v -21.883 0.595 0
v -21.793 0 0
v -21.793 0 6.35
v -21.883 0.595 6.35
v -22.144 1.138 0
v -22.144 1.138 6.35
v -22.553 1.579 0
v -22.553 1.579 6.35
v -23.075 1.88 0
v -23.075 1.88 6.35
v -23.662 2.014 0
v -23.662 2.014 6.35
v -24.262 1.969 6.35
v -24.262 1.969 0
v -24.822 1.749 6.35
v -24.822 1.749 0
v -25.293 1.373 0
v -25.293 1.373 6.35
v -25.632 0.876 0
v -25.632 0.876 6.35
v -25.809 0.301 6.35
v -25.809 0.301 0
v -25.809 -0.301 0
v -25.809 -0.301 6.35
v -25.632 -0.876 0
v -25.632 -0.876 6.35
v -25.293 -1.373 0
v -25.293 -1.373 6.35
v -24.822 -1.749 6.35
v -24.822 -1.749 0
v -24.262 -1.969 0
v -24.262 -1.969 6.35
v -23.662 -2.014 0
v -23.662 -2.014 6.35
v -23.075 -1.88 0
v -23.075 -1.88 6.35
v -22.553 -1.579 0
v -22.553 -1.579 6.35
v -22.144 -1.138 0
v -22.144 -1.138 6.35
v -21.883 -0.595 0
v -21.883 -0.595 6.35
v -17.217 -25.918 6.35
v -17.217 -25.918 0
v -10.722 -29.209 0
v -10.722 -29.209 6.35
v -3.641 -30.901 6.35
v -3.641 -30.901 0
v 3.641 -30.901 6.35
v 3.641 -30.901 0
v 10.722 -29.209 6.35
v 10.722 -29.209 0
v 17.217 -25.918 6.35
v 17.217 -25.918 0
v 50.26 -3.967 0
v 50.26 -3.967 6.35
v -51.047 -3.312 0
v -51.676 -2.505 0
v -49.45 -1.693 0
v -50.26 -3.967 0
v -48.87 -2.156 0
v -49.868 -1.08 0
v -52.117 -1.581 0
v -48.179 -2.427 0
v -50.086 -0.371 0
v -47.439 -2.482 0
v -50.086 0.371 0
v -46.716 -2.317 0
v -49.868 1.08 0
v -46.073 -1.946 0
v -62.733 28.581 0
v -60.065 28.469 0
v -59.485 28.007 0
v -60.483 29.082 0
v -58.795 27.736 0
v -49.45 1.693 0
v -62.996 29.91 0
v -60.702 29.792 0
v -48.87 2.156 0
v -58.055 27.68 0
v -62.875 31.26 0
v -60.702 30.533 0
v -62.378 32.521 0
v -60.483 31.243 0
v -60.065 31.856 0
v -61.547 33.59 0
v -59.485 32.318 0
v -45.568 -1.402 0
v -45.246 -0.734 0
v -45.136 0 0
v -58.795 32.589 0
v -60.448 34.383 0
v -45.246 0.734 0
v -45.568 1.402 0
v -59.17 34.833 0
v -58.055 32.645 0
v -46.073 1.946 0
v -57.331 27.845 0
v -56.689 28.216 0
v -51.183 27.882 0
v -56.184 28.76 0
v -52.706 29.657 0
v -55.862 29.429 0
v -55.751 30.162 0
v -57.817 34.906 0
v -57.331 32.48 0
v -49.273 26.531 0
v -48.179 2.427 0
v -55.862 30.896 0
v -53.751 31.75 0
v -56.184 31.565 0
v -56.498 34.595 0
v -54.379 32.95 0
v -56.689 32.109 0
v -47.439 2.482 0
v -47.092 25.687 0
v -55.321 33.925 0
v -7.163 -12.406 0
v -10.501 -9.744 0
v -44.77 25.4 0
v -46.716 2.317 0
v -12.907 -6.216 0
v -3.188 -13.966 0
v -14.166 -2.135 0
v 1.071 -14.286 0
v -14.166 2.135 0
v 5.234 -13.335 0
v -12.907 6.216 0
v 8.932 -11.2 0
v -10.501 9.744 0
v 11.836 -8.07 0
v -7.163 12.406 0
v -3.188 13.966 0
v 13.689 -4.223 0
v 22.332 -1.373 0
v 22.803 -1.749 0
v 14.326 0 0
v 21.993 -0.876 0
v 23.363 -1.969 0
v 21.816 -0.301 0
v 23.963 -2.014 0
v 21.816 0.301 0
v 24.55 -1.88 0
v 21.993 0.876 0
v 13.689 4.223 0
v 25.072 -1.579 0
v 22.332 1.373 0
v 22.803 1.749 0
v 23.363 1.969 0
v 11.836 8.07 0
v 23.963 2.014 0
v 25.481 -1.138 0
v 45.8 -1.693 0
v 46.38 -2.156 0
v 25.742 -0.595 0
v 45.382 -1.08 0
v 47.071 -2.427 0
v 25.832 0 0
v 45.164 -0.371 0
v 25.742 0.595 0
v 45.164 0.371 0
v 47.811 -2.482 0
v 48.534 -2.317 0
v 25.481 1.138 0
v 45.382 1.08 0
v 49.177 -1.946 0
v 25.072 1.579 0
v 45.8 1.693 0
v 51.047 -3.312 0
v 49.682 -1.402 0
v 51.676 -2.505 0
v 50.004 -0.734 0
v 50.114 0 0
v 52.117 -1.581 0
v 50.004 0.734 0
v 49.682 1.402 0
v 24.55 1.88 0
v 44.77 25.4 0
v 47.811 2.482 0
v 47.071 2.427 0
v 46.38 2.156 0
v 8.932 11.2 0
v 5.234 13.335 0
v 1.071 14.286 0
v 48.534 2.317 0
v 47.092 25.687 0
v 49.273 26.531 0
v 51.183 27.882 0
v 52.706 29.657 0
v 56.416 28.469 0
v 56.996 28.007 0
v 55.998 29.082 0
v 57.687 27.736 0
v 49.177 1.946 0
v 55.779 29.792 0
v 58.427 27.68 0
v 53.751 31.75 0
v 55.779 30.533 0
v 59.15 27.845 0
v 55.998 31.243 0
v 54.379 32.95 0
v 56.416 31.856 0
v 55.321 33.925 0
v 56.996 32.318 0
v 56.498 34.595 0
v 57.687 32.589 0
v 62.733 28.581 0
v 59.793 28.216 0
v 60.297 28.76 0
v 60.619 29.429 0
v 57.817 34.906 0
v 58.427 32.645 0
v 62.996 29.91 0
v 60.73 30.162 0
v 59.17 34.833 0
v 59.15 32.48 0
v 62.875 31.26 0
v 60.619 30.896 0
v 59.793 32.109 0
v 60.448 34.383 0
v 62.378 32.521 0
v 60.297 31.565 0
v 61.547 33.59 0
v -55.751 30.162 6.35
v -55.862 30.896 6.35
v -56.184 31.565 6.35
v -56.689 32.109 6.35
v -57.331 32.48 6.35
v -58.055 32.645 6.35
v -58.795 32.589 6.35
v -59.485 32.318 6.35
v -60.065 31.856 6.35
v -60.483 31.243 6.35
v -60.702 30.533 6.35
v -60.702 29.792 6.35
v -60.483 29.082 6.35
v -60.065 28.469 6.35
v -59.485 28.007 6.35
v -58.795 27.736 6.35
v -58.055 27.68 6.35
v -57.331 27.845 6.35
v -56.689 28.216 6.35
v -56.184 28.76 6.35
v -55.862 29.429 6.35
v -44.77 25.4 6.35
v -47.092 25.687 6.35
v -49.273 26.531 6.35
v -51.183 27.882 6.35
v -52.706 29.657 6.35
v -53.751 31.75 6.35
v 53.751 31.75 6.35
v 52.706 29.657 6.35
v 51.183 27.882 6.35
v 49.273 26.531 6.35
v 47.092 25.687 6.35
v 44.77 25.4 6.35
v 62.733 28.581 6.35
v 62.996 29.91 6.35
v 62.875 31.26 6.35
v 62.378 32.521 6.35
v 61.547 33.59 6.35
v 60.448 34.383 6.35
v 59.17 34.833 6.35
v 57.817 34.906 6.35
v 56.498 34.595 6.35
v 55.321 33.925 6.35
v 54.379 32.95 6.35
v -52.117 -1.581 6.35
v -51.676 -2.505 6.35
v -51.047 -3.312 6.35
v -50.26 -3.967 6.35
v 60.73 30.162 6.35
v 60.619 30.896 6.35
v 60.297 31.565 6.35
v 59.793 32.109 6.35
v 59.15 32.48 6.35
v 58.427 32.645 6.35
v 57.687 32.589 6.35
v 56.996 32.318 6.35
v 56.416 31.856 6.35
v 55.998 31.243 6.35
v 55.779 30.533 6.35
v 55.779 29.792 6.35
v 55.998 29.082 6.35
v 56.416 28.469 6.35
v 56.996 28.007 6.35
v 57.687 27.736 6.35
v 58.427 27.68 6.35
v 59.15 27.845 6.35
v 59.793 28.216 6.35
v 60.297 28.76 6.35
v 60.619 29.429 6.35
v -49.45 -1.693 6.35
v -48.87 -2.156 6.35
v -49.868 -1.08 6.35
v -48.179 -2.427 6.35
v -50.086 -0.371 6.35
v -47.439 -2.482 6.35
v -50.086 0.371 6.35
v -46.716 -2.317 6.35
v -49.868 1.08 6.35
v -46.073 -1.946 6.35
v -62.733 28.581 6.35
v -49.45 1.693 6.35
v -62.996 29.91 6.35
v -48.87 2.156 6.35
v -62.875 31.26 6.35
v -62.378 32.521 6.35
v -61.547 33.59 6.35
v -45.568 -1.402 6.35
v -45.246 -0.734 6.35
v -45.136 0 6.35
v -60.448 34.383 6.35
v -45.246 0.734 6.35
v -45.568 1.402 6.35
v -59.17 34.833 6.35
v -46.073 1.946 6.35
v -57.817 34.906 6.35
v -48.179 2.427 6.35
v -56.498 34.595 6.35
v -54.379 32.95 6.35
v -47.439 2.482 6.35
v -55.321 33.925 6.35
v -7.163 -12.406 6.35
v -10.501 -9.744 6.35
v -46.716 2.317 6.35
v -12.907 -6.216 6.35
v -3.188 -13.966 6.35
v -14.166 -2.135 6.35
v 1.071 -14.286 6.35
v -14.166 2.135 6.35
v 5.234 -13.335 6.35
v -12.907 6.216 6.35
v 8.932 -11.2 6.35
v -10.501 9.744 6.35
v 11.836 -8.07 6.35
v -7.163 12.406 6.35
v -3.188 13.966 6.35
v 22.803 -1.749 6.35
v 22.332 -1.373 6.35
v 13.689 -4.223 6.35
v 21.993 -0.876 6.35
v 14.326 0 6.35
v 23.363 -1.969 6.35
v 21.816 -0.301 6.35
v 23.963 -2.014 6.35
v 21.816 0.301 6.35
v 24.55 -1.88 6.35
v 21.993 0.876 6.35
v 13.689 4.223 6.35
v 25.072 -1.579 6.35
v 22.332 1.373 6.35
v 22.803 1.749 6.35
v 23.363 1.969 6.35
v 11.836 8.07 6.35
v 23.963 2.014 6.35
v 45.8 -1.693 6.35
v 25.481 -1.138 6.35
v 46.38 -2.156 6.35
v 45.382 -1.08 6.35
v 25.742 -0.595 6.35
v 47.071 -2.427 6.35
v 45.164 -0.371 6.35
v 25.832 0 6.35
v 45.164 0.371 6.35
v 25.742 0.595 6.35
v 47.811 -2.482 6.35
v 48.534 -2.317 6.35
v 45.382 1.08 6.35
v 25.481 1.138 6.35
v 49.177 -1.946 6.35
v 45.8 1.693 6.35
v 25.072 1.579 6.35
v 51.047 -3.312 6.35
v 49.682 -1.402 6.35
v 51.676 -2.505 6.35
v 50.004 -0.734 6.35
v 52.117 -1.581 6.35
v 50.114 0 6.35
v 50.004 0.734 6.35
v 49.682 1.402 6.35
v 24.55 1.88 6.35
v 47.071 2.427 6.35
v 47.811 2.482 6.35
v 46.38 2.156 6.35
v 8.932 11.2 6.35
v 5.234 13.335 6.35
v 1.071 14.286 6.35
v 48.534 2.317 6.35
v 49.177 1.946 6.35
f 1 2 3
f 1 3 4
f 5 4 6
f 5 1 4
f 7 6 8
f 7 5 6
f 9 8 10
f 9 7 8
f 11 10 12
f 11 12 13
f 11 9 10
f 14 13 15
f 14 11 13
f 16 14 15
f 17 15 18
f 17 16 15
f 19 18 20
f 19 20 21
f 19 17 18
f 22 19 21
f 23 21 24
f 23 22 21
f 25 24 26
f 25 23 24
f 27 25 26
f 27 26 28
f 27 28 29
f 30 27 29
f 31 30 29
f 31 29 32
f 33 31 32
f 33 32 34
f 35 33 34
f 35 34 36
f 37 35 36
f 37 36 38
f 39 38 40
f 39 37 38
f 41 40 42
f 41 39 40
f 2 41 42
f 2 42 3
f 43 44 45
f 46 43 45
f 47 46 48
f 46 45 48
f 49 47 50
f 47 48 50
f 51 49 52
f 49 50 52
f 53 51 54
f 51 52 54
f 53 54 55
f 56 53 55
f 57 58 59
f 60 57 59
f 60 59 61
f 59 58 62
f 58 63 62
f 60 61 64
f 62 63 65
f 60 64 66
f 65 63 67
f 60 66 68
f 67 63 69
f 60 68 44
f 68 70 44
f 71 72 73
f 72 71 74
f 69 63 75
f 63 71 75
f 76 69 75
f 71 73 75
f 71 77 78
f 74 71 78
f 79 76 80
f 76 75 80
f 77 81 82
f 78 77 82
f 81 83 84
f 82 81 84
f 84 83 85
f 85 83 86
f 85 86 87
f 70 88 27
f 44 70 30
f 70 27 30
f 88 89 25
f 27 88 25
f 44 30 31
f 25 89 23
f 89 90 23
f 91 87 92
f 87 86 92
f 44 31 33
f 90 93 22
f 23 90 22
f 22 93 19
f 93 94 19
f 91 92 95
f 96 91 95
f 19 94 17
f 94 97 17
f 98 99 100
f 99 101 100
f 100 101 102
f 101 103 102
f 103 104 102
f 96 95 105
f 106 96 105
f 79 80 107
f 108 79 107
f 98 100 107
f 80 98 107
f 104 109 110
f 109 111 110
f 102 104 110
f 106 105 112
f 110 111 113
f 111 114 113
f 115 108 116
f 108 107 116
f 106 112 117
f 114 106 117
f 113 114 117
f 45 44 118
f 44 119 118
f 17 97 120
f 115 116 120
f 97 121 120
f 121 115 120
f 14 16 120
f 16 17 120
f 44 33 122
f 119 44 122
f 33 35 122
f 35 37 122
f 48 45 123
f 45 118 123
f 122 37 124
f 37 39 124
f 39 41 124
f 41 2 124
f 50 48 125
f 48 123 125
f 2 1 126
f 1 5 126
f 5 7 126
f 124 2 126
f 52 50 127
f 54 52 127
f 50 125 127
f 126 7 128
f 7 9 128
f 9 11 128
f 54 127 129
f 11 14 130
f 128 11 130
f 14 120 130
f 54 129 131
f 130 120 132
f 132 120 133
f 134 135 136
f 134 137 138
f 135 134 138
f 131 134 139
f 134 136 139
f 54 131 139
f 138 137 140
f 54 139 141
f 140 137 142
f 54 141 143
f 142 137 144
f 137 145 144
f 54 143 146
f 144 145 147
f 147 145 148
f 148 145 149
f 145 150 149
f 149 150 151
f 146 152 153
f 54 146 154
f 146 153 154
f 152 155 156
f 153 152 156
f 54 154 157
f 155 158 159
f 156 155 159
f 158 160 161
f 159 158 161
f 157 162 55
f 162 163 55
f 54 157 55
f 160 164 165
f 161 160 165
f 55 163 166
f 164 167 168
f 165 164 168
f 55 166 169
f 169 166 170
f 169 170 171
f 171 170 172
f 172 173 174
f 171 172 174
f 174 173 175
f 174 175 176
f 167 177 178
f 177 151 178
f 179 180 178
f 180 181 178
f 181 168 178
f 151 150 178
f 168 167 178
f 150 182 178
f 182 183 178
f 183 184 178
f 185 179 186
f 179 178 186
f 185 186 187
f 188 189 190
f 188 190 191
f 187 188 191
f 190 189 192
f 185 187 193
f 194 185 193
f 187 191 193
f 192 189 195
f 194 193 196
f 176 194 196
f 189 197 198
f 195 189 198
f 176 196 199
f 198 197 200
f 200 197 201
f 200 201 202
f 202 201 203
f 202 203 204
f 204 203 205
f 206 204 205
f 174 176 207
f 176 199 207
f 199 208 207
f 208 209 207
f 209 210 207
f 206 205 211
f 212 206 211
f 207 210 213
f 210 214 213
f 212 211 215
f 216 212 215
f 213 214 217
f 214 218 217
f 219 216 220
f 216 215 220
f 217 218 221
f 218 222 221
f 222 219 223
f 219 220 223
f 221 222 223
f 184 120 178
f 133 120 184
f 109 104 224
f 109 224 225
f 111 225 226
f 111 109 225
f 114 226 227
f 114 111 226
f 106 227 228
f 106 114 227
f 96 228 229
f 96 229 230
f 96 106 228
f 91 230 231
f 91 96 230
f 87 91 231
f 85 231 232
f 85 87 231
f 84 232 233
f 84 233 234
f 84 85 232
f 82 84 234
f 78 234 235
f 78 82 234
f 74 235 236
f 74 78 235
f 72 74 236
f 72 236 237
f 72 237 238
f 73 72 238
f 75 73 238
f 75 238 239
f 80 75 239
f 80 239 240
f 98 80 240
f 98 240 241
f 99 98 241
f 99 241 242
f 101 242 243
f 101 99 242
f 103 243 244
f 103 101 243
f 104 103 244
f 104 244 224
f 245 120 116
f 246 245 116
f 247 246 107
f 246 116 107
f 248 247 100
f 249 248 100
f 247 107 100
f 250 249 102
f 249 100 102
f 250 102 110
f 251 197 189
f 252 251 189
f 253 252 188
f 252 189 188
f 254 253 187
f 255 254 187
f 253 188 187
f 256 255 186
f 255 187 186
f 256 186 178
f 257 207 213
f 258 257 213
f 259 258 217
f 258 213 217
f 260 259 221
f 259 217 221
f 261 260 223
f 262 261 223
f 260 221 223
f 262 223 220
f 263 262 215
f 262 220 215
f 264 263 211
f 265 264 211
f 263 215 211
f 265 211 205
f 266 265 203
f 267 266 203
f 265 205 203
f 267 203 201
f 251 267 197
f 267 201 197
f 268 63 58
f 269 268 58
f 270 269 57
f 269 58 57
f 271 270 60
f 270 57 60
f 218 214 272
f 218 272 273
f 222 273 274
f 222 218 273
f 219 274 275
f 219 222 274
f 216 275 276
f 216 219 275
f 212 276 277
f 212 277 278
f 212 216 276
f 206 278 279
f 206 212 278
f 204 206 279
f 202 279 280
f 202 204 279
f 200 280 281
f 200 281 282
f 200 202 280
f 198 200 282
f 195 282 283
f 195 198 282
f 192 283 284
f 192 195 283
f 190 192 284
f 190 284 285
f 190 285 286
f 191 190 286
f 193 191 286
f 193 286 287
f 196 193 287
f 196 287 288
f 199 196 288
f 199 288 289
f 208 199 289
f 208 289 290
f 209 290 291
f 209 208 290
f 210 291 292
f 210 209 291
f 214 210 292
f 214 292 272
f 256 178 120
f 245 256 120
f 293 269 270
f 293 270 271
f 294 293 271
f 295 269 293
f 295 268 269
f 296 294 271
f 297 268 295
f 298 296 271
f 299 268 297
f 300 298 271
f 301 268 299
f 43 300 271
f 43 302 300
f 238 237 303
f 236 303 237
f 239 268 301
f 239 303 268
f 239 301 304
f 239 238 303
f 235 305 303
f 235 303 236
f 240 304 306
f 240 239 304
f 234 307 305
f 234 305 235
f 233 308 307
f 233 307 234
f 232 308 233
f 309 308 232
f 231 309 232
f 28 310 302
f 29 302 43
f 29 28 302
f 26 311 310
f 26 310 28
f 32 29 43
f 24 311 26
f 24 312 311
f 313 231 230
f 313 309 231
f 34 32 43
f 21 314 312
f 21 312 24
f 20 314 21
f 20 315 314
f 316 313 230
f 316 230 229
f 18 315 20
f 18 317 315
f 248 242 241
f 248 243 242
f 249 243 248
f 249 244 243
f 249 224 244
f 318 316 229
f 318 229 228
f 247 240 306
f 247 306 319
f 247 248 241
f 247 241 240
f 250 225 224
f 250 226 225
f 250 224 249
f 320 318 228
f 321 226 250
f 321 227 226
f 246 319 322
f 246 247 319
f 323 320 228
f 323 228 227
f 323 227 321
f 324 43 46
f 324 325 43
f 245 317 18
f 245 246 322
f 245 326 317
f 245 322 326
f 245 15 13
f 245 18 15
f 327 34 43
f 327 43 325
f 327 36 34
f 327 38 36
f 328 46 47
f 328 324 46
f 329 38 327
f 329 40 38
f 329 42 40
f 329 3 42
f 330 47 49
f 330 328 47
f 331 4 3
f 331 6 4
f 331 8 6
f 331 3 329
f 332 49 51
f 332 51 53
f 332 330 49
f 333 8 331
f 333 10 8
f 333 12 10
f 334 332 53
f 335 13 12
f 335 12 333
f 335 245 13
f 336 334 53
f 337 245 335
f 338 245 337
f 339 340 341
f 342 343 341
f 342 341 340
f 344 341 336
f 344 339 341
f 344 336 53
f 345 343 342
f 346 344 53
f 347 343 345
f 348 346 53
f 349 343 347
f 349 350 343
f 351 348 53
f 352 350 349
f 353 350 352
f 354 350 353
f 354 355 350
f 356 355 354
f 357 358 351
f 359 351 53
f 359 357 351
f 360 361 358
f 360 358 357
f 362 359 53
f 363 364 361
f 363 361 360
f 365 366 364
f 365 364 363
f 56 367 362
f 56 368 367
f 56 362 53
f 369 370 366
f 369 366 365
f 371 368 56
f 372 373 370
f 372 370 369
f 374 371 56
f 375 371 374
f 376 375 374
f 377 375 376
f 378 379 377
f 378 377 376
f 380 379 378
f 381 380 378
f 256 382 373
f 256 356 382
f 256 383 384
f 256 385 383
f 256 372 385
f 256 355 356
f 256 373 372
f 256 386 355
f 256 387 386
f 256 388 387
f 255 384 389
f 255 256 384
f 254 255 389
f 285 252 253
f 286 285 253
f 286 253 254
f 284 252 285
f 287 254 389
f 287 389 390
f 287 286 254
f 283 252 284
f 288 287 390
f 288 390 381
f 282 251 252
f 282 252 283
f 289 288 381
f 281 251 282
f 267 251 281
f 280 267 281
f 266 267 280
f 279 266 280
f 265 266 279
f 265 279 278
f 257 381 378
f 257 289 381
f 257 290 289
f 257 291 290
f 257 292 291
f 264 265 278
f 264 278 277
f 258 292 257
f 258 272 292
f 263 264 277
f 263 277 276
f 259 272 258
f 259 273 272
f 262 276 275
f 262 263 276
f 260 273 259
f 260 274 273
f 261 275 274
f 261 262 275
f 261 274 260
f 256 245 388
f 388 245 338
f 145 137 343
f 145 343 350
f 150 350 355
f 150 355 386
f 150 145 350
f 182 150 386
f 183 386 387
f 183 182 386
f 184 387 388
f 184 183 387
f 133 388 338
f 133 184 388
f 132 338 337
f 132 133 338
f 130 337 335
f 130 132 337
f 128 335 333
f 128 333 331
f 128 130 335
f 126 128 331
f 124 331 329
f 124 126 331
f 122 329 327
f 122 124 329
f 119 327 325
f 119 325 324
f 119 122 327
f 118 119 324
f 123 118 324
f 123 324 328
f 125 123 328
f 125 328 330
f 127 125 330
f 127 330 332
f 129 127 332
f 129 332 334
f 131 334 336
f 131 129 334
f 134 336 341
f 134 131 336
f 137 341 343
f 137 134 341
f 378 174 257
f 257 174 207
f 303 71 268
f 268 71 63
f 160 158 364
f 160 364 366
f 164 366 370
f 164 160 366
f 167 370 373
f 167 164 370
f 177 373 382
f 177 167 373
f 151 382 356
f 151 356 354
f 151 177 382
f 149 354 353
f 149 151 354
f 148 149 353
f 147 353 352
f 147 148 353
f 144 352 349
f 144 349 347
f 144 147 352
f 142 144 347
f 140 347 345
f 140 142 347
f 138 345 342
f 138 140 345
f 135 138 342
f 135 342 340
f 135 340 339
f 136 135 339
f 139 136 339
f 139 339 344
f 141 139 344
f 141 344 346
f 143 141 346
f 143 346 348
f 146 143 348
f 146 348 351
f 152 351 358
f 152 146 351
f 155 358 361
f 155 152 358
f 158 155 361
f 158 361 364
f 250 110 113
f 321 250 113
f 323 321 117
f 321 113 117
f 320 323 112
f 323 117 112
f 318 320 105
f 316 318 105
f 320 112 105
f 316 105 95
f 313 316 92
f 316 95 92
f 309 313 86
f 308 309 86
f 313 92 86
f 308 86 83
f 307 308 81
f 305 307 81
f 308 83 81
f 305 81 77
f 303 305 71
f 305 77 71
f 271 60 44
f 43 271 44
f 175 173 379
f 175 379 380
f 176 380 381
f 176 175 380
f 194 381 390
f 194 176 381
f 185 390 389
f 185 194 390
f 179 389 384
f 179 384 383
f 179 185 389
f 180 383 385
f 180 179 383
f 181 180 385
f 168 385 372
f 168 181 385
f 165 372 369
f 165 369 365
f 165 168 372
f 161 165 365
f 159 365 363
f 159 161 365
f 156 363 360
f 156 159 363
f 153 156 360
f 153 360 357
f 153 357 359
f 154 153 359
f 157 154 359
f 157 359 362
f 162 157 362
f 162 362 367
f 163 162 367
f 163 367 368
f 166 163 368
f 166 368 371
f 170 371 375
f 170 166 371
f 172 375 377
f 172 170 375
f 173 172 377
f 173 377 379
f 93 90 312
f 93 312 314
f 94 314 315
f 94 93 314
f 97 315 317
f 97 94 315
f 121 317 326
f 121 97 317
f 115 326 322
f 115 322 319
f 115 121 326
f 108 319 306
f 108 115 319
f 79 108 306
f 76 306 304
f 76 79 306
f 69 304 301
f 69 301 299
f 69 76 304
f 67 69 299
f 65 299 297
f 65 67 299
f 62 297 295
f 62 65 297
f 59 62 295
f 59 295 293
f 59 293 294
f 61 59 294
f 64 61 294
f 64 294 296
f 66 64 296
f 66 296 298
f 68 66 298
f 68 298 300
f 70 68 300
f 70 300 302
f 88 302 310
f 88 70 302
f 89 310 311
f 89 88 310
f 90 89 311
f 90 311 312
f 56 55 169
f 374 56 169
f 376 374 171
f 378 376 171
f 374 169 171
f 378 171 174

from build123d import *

# Parameters (mm, degrees)
CROQUIS2_R                    = 2.0193
CROQUIS2_R_2                  = 14.3256
CROQUIS2_R_3                  = 2.4892
SALIENTE_EXTRUIR1_DEPTH       = 6.35
CROQUIS4_R                    = 11.1125
CROQUIS4_R_2                  = 2.0193
CROQUIS4_R_3                  = 14.3256
CROQUIS4_R_4                  = 2.4892
CROQUIS4_R_5                  = 12.7
SALIENTE_EXTRUIR2_DEPTH       = 6.35
SALIENTE_EXTRUIR3_OUTLINE_R   = 2.4892
SALIENTE_EXTRUIR3_OUTLINE_R_2 = 11.1125
SALIENTE_EXTRUIR3_DEPTH       = 3.175


# Read off the part's stored shape, not the designer's step: Saliente-Extruir3
with BuildPart() as part:
    # Croquis2 → Saliente-Extruir1 (new body)
    with BuildSketch(Plane.XY):
        with BuildLine():
            Line((-50.26025, -3.966971602), (-17.216966667, -25.917547797))
            ThreePointArc((-17.216966667, -25.917547797), (0, -31.115), (17.216966667, -25.917547797))
            Line((17.216966667, -25.917547797), (50.26025, -3.966971602))
            ThreePointArc((50.26025, -3.966971602), (51.383179934, -2.925318757), (52.117388984, -1.581090594))
            Line((52.117388984, -1.581090594), (62.733042527, 28.581409406))
            ThreePointArc((62.733042527, 28.581409406), (59.824949243, 34.653759666), (53.750525482, 31.75))
            ThreePointArc((53.750525482, 31.75), (50.269530675, 27.147870067), (44.770269361, 25.4))
            Line((44.770269361, 25.4), (-44.770269361, 25.4))
            ThreePointArc((-44.770269361, 25.4), (-50.269530675, 27.147870067), (-53.750525482, 31.75))
            ThreePointArc((-53.750525482, 31.75), (-59.824949243, 34.653759666), (-62.733042527, 28.581409406))
            Line((-62.733042527, 28.581409406), (-52.117388984, -1.581090594))
            ThreePointArc((-52.117388984, -1.581090594), (-51.383179934, -2.925318757), (-50.26025, -3.966971602))
        make_face()
        with Locations((23.8125, 0)):
            Circle(CROQUIS2_R, mode=Mode.SUBTRACT)
        with Locations((-23.8125, 0)):
            Circle(CROQUIS2_R, mode=Mode.SUBTRACT)
        Circle(CROQUIS2_R_2, mode=Mode.SUBTRACT)
        with Locations((-47.625, 0)):
            Circle(CROQUIS2_R_3, mode=Mode.SUBTRACT)
        with Locations((47.625, 0)):
            Circle(CROQUIS2_R_3, mode=Mode.SUBTRACT)
        with Locations((-58.240653543, 30.1625)):
            Circle(CROQUIS2_R_3, mode=Mode.SUBTRACT)
        with Locations((58.240653543, 30.1625)):
            Circle(CROQUIS2_R_3, mode=Mode.SUBTRACT)
    extrude(amount=SALIENTE_EXTRUIR1_DEPTH)


with BuildPart() as body_2:
    # Croquis4 → Saliente-Extruir2 (new body)
    with BuildSketch(Plane.XY):
        with BuildLine():
            Line((-63.003153543, 56.9875), (-63.003153543, 30.1625))
            ThreePointArc((-63.003153543, 30.1625), (-62.935140138, 29.360501336), (-62.733042527, 28.581409406))
            Line((-62.733042527, 28.581409406), (-52.117388984, -1.581090594))
            ThreePointArc((-52.117388984, -1.581090594), (-51.383179934, -2.925318757), (-50.26025, -3.966971602))
            Line((-50.26025, -3.966971602), (-17.216966667, -25.917547797))
            ThreePointArc((-17.216966667, -25.917547797), (0, -31.115), (17.216966667, -25.917547797))
            Line((17.216966667, -25.917547797), (50.26025, -3.966971602))
            ThreePointArc((50.26025, -3.966971602), (51.383179934, -2.925318757), (52.117388984, -1.581090594))
            Line((52.117388984, -1.581090594), (62.733042527, 28.581409406))
            ThreePointArc((62.733042527, 28.581409406), (62.935140138, 29.360501336), (63.003153543, 30.1625))
            Line((63.003153543, 30.1625), (63.003153543, 56.9875))
            ThreePointArc((63.003153543, 56.9875), (54.216356978, 78.200703436), (33.003153543, 86.9875))
            Line((33.003153543, 86.9875), (-33.003153543, 86.9875))
            ThreePointArc((-33.003153543, 86.9875), (-54.216356978, 78.200703436), (-63.003153543, 56.9875))
        make_face()
        with Locations((0, 40.64)):
            Circle(CROQUIS4_R, mode=Mode.SUBTRACT)
        with Locations((-16.145831218, -9.3218)):
            Circle(CROQUIS4_R_2, mode=Mode.SUBTRACT)
        Circle(CROQUIS4_R_3, mode=Mode.SUBTRACT)
        with Locations((0, 18.6436)):
            Circle(CROQUIS4_R_2, mode=Mode.SUBTRACT)
        with Locations((16.145831218, -9.3218)):
            Circle(CROQUIS4_R_2, mode=Mode.SUBTRACT)
        with Locations((-47.625, 0)):
            Circle(CROQUIS4_R_4, mode=Mode.SUBTRACT)
        with Locations((47.625, 0)):
            Circle(CROQUIS4_R_4, mode=Mode.SUBTRACT)
        with Locations((-29.02971813, 82.074783851)):
            Circle(CROQUIS4_R_4, mode=Mode.SUBTRACT)
        with Locations((-36.976588955, 31.900216149)):
            Circle(CROQUIS4_R_4, mode=Mode.SUBTRACT)
        with Locations((-33.003153543, 56.9875)):
            Circle(CROQUIS4_R_5, mode=Mode.SUBTRACT)
        with Locations((-58.090437394, 60.960935412)):
            Circle(CROQUIS4_R_4, mode=Mode.SUBTRACT)
        with Locations((-58.240653543, 30.1625)):
            Circle(CROQUIS4_R_4, mode=Mode.SUBTRACT)
        with Locations((58.090437394, 60.960935412)):
            Circle(CROQUIS4_R_4, mode=Mode.SUBTRACT)
        with Locations((36.976588955, 31.900216149)):
            Circle(CROQUIS4_R_4, mode=Mode.SUBTRACT)
        with Locations((33.003153543, 56.9875)):
            Circle(CROQUIS4_R_5, mode=Mode.SUBTRACT)
        with Locations((29.02971813, 82.074783851)):
            Circle(CROQUIS4_R_4, mode=Mode.SUBTRACT)
        with Locations((58.240653543, 30.1625)):
            Circle(CROQUIS4_R_4, mode=Mode.SUBTRACT)
    extrude(amount=-SALIENTE_EXTRUIR2_DEPTH)


with BuildPart() as body_3:
    # Saliente-Extruir3 outline → Saliente-Extruir3 (new body)
    with BuildSketch(Plane.XY):
        with BuildLine():
            Line((-35.881109014, 27.265420582), (-22.987624276, 30.312923688))
            ThreePointArc((-22.987624276, 30.312923688), (-18.059295743, 30.166513899), (-13.86444293, 27.575555036))
            ThreePointArc((-13.86444293, 27.575555036), (0, 21.59), (13.86444293, 27.575555036))
            ThreePointArc((13.86444293, 27.575555036), (18.059295743, 30.166513899), (22.987624276, 30.312923688))
            Line((22.987624276, 30.312923688), (35.881109014, 27.265420582))
            ThreePointArc((35.881109014, 27.265420582), (41.611384522, 30.804736208), (38.072068895, 36.535011716))
            Line((38.072068895, 36.535011716), (23.323178626, 40.021058337))
            ThreePointArc((23.323178626, 40.021058337), (20.26820543, 41.736288231), (18.58786391, 44.81058932))
            ThreePointArc((18.58786391, 44.81058932), (18.032030897, 46.783969542), (17.267348762, 48.686189579))
            ThreePointArc((17.267348762, 48.686189579), (16.412494406, 53.542019269), (18.100083663, 58.174718315))
            Line((18.100083663, 58.174718315), (32.93018787, 79.342066878))
            ThreePointArc((32.93018787, 79.342066878), (31.762435104, 85.975253591), (25.129248391, 84.807500825))
            Line((25.129248391, 84.807500825), (11.314654439, 65.08961339))
            ThreePointArc((11.314654439, 65.08961339), (6.613405383, 61.027851685), (0.54804108, 59.682115192))
            ThreePointArc((0.54804108, 59.682115192), (0, 59.69), (-0.54804108, 59.682115192))
            ThreePointArc((-0.54804108, 59.682115192), (-6.613405383, 61.027851685), (-11.314654439, 65.08961339))
            Line((-11.314654439, 65.08961339), (-25.129248391, 84.807500825))
            ThreePointArc((-25.129248391, 84.807500825), (-31.762435104, 85.975253591), (-32.93018787, 79.342066878))
            Line((-32.93018787, 79.342066878), (-18.100083663, 58.174718315))
            ThreePointArc((-18.100083663, 58.174718315), (-16.412494406, 53.542019269), (-17.267348762, 48.686189579))
            ThreePointArc((-17.267348762, 48.686189579), (-18.032030897, 46.783969542), (-18.58786391, 44.81058932))
            ThreePointArc((-18.58786391, 44.81058932), (-20.26820543, 41.736288231), (-23.323178626, 40.021058337))
            Line((-23.323178626, 40.021058337), (-38.072068895, 36.535011716))
            ThreePointArc((-38.072068895, 36.535011716), (-41.611384522, 30.804736208), (-35.881109014, 27.265420582))
        make_face()
        with Locations((-36.976588955, 31.900216149)):
            Circle(SALIENTE_EXTRUIR3_OUTLINE_R, mode=Mode.SUBTRACT)
        with Locations((36.976588955, 31.900216149)):
            Circle(SALIENTE_EXTRUIR3_OUTLINE_R, mode=Mode.SUBTRACT)
        with Locations((0, 40.64)):
            Circle(SALIENTE_EXTRUIR3_OUTLINE_R_2, mode=Mode.SUBTRACT)
        with Locations((-29.02971813, 82.074783851)):
            Circle(SALIENTE_EXTRUIR3_OUTLINE_R, mode=Mode.SUBTRACT)
        with Locations((29.02971813, 82.074783851)):
            Circle(SALIENTE_EXTRUIR3_OUTLINE_R, mode=Mode.SUBTRACT)
    extrude(amount=SALIENTE_EXTRUIR3_DEPTH)


solid = part.part
